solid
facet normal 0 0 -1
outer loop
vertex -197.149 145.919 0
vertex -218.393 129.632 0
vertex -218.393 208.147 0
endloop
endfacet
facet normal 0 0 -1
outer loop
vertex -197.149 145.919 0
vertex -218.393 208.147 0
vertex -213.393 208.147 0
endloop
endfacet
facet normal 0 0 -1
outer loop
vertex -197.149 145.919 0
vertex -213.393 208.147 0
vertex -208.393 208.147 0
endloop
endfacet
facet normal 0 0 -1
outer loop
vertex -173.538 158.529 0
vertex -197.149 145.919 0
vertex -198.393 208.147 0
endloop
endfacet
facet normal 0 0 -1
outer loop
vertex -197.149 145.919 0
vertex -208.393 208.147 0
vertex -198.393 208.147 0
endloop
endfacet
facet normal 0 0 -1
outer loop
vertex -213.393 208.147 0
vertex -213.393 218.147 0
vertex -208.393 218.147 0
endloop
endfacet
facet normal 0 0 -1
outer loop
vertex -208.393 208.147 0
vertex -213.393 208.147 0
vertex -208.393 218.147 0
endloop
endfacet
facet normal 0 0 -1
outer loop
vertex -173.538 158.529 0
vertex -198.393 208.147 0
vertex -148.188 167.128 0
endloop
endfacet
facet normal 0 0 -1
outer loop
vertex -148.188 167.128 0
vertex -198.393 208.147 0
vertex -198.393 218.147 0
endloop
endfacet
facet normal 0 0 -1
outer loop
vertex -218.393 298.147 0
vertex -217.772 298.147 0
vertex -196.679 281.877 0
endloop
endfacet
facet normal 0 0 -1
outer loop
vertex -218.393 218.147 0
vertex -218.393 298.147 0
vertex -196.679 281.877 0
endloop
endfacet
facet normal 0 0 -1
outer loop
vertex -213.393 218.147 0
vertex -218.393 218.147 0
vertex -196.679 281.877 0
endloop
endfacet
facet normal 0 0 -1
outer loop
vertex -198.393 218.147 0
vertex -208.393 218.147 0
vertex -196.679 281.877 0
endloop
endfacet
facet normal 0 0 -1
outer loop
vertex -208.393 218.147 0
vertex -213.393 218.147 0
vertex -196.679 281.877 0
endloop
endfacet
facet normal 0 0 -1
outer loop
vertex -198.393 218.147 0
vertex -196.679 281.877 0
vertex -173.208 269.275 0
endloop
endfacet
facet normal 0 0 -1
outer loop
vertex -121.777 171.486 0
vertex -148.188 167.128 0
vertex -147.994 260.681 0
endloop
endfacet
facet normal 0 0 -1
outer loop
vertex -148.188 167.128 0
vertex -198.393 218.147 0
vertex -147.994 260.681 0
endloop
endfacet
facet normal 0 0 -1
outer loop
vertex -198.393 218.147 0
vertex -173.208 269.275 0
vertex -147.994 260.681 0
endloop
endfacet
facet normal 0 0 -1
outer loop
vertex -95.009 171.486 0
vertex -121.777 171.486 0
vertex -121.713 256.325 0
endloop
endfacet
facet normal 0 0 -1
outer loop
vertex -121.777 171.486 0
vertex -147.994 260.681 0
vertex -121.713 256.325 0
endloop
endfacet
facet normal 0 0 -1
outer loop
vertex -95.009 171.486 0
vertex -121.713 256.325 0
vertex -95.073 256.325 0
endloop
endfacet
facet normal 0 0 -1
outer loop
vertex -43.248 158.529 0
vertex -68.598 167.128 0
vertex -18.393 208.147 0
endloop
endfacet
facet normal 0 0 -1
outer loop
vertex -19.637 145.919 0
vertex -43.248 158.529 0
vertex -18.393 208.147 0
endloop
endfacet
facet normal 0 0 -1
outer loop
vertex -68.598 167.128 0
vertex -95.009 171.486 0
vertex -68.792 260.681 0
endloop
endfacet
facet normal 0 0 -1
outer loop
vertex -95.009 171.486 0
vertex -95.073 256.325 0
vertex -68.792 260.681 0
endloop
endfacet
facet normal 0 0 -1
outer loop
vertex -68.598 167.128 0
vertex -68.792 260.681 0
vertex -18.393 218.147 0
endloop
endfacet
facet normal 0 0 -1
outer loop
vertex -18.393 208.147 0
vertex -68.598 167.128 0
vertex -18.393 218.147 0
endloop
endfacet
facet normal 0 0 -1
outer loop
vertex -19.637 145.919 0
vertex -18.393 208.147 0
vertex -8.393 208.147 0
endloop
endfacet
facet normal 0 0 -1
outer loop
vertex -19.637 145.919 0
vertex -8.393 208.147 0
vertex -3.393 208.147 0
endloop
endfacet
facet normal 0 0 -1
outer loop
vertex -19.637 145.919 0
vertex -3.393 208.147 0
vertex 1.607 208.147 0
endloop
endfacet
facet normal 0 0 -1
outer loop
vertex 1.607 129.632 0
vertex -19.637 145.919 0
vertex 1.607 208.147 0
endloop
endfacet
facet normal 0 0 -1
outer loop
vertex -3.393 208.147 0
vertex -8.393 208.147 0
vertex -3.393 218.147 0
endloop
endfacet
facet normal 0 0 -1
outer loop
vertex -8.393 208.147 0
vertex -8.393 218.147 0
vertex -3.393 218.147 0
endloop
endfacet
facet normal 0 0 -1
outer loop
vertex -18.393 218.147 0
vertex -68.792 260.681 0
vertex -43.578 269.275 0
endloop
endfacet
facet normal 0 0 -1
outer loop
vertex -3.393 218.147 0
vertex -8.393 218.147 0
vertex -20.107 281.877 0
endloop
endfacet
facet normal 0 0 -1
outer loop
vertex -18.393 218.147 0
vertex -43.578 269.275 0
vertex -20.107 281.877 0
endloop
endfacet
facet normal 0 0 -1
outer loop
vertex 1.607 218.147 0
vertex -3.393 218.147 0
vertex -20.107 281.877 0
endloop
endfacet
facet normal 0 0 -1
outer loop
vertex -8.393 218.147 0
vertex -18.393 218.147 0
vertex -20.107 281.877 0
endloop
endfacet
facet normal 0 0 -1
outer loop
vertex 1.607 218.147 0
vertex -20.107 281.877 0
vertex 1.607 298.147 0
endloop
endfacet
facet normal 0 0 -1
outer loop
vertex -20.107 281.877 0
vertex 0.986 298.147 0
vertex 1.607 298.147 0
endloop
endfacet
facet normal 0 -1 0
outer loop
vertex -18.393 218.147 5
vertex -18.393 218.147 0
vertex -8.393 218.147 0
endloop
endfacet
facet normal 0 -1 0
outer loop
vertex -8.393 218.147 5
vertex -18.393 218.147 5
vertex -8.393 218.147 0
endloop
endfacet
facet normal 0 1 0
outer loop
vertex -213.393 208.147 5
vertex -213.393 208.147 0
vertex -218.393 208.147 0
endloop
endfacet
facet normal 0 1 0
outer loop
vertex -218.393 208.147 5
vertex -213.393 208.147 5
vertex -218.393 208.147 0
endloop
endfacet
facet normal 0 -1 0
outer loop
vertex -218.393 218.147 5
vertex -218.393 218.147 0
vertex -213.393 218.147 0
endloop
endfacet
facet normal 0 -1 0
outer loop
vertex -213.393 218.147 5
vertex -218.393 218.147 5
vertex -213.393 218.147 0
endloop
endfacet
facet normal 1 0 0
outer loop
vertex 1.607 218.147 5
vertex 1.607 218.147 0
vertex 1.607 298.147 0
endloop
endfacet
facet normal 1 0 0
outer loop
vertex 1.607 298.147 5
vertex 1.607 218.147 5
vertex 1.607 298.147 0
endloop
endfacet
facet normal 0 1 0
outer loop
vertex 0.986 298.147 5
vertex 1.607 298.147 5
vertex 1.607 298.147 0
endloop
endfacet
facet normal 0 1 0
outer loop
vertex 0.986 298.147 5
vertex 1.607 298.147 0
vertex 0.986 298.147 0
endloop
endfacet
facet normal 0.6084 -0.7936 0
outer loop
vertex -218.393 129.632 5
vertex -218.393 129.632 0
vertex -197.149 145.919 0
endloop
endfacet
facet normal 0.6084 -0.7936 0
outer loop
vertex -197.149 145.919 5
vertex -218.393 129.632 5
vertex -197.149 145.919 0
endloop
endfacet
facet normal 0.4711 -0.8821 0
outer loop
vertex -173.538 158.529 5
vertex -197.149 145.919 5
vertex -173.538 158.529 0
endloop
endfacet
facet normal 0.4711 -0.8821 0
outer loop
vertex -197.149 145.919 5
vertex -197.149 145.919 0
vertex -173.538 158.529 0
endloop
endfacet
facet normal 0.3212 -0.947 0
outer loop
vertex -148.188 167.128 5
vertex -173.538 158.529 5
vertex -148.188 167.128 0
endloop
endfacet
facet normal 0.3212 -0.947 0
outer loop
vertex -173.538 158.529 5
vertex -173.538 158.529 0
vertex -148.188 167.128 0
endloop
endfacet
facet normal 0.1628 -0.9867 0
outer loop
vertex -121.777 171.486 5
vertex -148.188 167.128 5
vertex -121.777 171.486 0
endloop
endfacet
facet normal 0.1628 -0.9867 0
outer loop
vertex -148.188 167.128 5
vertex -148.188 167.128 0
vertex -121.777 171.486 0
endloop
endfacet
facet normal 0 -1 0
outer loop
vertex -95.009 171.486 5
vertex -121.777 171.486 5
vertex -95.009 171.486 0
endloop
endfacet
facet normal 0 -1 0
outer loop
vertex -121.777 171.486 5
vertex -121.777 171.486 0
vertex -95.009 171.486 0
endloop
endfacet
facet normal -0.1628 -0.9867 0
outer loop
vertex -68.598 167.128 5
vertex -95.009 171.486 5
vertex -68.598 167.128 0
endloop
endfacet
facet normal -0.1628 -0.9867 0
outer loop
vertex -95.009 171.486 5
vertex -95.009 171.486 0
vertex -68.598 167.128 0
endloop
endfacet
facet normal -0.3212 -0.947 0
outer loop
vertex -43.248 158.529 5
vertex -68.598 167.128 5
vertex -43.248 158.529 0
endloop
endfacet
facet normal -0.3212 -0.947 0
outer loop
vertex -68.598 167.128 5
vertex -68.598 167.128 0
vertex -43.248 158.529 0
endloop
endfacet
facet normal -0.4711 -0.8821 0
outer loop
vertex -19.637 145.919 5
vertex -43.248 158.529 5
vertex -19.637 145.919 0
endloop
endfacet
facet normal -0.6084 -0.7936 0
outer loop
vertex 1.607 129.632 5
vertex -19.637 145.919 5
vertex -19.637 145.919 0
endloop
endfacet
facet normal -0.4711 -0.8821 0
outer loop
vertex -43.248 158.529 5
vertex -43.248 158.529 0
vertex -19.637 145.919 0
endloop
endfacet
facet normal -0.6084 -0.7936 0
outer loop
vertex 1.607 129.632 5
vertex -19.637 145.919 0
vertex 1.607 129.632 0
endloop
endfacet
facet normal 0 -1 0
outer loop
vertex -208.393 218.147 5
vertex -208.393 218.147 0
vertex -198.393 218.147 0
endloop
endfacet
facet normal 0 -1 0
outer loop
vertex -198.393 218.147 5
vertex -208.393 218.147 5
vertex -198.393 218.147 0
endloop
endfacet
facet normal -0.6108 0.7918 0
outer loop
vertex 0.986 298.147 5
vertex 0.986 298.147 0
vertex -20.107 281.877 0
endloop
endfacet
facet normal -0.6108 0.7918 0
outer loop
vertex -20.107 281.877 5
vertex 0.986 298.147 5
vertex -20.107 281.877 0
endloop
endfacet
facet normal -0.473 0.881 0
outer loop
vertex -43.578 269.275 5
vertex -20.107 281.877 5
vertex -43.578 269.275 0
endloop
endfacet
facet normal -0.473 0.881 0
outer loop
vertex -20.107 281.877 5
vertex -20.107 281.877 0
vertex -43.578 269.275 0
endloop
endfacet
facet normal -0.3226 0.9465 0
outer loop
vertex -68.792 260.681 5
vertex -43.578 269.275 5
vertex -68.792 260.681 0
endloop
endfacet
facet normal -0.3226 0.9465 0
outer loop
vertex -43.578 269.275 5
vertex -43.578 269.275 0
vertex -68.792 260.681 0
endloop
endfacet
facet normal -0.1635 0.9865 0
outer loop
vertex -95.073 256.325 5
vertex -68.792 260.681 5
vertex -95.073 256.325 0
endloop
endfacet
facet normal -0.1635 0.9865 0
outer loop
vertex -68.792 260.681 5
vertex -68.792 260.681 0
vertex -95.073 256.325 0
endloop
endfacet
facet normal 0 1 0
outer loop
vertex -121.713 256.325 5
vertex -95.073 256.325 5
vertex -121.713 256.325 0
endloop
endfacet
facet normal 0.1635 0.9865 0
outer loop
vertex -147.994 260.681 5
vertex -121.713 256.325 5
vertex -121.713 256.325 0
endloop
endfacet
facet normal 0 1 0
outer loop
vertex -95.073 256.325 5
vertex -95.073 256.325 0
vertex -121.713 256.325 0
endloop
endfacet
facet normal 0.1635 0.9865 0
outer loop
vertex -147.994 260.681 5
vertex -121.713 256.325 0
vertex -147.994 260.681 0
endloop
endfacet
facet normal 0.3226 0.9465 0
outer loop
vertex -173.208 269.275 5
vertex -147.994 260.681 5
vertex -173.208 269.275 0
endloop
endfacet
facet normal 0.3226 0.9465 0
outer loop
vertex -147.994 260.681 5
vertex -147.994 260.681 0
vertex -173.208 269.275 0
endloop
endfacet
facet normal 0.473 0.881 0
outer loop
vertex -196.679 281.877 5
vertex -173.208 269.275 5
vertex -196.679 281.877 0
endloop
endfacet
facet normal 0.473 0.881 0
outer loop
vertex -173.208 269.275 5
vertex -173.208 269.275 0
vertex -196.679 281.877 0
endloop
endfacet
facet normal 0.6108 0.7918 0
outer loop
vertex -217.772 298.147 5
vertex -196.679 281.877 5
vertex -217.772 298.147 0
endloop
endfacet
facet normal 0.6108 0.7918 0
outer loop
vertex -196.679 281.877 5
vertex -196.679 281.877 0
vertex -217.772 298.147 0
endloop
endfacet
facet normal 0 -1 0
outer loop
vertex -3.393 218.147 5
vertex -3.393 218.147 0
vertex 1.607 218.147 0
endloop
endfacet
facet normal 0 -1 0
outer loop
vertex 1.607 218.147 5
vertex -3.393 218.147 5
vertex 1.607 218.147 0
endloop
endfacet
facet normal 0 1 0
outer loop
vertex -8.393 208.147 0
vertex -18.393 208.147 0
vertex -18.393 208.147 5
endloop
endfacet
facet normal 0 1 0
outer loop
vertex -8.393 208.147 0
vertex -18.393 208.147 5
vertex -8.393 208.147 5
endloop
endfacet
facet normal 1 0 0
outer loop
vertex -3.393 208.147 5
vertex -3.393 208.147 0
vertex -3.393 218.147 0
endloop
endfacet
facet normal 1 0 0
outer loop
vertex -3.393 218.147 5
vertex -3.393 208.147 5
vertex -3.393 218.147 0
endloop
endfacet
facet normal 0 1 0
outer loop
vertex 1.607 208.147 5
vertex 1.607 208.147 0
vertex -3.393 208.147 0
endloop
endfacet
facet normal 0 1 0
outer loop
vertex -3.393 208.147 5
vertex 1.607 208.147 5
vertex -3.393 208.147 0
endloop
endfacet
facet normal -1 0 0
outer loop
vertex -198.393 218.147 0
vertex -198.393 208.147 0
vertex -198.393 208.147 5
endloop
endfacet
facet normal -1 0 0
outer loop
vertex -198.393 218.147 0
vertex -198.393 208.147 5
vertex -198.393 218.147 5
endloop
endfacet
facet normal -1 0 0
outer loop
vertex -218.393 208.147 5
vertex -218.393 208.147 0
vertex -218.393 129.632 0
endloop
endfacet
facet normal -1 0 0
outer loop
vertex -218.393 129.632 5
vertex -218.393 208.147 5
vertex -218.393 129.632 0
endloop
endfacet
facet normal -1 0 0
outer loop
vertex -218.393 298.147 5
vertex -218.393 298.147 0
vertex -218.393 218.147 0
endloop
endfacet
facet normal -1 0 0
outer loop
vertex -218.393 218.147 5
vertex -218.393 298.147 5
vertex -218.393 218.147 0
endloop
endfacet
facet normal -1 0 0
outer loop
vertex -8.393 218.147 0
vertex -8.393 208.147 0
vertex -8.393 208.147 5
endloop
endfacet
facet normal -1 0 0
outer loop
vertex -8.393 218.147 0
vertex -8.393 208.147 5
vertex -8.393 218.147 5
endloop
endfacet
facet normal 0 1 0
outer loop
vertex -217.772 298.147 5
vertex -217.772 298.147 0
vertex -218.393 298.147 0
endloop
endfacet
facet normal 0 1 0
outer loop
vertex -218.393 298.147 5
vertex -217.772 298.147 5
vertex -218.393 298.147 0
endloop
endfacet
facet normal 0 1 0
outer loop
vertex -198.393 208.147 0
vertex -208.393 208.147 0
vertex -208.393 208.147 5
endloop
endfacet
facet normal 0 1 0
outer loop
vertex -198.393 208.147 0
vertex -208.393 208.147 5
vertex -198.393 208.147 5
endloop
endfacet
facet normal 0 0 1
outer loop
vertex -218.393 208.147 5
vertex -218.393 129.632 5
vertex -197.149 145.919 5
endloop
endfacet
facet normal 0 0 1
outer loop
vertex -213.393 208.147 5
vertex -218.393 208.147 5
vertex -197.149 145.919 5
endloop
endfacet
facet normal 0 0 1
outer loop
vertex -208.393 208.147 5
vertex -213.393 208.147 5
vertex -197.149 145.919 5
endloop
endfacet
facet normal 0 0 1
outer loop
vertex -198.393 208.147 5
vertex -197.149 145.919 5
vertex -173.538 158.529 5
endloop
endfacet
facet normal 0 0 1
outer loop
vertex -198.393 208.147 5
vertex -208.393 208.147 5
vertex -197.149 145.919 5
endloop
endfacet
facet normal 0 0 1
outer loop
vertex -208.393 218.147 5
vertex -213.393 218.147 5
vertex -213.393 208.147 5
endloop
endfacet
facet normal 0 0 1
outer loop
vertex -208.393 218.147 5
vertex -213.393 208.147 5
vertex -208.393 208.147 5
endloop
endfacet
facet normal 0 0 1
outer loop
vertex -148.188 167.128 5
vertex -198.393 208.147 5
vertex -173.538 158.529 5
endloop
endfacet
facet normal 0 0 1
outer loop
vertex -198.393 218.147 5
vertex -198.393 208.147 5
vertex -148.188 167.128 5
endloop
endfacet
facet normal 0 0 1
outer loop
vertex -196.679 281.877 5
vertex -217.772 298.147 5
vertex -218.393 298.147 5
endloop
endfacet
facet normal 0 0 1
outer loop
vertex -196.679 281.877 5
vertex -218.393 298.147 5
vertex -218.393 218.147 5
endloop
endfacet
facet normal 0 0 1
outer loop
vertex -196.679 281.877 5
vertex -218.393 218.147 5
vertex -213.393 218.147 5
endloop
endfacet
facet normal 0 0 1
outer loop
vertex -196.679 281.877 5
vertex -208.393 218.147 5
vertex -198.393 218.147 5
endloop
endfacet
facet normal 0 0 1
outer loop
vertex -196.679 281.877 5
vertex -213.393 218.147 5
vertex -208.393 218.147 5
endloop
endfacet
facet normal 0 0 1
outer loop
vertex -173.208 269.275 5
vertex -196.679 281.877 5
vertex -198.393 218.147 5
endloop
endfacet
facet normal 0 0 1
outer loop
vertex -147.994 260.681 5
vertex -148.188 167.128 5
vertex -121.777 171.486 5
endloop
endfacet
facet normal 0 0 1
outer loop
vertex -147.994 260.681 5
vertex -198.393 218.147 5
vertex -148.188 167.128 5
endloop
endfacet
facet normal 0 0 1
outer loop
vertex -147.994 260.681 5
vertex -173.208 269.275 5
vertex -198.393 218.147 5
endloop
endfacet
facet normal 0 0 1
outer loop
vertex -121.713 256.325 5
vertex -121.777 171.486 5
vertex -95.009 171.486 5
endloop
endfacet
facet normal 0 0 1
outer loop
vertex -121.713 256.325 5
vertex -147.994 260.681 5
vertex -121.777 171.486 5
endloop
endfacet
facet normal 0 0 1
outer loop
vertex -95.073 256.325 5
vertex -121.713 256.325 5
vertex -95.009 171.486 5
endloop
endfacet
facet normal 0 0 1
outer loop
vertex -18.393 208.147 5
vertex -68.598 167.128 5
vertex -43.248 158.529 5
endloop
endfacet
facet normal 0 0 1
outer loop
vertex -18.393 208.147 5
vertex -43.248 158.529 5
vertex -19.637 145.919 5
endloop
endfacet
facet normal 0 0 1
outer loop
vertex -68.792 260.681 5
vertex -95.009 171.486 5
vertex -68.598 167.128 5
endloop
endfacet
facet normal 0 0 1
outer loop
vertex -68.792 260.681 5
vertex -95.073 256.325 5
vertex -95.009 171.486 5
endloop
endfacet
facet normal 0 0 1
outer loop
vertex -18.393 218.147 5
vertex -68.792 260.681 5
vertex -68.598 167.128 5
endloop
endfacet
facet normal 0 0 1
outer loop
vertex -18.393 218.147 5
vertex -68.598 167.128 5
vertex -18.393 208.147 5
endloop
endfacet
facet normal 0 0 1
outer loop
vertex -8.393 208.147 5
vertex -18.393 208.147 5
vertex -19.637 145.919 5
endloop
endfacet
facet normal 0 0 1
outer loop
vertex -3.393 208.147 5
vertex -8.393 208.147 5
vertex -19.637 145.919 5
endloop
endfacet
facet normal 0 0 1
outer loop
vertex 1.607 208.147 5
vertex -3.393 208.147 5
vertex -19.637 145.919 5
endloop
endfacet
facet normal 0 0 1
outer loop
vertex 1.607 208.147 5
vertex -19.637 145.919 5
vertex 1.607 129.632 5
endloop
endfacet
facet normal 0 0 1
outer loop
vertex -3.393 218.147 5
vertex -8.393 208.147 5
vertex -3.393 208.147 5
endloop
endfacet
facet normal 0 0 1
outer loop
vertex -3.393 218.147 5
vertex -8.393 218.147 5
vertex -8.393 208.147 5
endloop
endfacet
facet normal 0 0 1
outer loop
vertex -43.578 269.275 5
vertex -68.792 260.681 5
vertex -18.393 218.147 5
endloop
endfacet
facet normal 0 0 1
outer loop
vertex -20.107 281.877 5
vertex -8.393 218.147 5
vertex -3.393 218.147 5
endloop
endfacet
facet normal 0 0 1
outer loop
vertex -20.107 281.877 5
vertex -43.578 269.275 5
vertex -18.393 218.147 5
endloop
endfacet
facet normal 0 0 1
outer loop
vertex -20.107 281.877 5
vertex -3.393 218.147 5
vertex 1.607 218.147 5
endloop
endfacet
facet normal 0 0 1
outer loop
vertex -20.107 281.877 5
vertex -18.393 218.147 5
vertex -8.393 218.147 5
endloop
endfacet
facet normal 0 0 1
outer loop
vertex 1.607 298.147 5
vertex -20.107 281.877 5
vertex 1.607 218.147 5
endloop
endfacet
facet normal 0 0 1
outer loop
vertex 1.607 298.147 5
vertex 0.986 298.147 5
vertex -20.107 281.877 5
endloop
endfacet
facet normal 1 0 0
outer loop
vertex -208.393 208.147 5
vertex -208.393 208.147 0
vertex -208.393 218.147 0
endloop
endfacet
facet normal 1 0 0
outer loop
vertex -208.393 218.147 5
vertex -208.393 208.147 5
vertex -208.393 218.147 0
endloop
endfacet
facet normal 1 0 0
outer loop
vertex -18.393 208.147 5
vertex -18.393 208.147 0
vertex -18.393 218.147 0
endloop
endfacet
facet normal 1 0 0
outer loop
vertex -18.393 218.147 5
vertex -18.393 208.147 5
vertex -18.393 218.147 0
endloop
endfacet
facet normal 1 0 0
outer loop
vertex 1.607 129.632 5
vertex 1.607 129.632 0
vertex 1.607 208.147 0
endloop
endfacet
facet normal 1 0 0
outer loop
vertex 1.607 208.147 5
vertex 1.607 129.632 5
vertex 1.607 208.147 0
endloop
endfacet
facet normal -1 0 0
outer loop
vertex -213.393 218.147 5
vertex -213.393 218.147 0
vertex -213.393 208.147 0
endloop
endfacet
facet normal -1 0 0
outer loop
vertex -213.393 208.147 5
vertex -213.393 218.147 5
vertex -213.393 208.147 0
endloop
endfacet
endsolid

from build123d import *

# Parameters (mm, degrees)
F0_W     = 10
F0_H     = 10
F1_DEPTH = 5


with BuildPart() as f1:
    # F0 (on Top) → F1 (new body)
    with BuildSketch(Plane.XY):
        with BuildLine():
            Line((-217.772444, 298.14717), (-218.393043, 298.14717))
            Line((-218.393043, 298.14717), (-218.393043, 218.14717))
            Line((-218.393043, 218.14717), (-213.393043, 218.14717))
            Line((-213.393043, 218.14717), (-213.393043, 208.14717))
            Line((-213.393043, 208.14717), (-218.393043, 208.14717))
            Line((-218.393043, 208.14717), (-218.393043, 129.632429))
            ThreePointArc((-218.393043, 129.632429), (-108.393043, 172.033314), (1.606957, 129.632429))
            Line((1.606957, 129.632429), (1.606957, 208.14717))
            Line((1.606957, 208.14717), (-3.393043, 208.14717))
            Line((-3.393043, 208.14717), (-3.393043, 218.14717))
            Line((-3.393043, 218.14717), (1.606957, 218.14717))
            Line((1.606957, 218.14717), (1.606957, 298.14717))
            Line((1.606957, 298.14717), (0.986359, 298.14717))
            ThreePointArc((0.986359, 298.14717), (-108.393043, 255.777673), (-217.772444, 298.14717))
        make_face()
        with Locations((-203.393043, 213.14717)):
            Rectangle(F0_W, F0_H, mode=Mode.SUBTRACT)
        with Locations((-13.393043, 213.14717)):
            Rectangle(F0_W, F0_H, mode=Mode.SUBTRACT)
    extrude(amount=F1_DEPTH)


solid = f1.part
